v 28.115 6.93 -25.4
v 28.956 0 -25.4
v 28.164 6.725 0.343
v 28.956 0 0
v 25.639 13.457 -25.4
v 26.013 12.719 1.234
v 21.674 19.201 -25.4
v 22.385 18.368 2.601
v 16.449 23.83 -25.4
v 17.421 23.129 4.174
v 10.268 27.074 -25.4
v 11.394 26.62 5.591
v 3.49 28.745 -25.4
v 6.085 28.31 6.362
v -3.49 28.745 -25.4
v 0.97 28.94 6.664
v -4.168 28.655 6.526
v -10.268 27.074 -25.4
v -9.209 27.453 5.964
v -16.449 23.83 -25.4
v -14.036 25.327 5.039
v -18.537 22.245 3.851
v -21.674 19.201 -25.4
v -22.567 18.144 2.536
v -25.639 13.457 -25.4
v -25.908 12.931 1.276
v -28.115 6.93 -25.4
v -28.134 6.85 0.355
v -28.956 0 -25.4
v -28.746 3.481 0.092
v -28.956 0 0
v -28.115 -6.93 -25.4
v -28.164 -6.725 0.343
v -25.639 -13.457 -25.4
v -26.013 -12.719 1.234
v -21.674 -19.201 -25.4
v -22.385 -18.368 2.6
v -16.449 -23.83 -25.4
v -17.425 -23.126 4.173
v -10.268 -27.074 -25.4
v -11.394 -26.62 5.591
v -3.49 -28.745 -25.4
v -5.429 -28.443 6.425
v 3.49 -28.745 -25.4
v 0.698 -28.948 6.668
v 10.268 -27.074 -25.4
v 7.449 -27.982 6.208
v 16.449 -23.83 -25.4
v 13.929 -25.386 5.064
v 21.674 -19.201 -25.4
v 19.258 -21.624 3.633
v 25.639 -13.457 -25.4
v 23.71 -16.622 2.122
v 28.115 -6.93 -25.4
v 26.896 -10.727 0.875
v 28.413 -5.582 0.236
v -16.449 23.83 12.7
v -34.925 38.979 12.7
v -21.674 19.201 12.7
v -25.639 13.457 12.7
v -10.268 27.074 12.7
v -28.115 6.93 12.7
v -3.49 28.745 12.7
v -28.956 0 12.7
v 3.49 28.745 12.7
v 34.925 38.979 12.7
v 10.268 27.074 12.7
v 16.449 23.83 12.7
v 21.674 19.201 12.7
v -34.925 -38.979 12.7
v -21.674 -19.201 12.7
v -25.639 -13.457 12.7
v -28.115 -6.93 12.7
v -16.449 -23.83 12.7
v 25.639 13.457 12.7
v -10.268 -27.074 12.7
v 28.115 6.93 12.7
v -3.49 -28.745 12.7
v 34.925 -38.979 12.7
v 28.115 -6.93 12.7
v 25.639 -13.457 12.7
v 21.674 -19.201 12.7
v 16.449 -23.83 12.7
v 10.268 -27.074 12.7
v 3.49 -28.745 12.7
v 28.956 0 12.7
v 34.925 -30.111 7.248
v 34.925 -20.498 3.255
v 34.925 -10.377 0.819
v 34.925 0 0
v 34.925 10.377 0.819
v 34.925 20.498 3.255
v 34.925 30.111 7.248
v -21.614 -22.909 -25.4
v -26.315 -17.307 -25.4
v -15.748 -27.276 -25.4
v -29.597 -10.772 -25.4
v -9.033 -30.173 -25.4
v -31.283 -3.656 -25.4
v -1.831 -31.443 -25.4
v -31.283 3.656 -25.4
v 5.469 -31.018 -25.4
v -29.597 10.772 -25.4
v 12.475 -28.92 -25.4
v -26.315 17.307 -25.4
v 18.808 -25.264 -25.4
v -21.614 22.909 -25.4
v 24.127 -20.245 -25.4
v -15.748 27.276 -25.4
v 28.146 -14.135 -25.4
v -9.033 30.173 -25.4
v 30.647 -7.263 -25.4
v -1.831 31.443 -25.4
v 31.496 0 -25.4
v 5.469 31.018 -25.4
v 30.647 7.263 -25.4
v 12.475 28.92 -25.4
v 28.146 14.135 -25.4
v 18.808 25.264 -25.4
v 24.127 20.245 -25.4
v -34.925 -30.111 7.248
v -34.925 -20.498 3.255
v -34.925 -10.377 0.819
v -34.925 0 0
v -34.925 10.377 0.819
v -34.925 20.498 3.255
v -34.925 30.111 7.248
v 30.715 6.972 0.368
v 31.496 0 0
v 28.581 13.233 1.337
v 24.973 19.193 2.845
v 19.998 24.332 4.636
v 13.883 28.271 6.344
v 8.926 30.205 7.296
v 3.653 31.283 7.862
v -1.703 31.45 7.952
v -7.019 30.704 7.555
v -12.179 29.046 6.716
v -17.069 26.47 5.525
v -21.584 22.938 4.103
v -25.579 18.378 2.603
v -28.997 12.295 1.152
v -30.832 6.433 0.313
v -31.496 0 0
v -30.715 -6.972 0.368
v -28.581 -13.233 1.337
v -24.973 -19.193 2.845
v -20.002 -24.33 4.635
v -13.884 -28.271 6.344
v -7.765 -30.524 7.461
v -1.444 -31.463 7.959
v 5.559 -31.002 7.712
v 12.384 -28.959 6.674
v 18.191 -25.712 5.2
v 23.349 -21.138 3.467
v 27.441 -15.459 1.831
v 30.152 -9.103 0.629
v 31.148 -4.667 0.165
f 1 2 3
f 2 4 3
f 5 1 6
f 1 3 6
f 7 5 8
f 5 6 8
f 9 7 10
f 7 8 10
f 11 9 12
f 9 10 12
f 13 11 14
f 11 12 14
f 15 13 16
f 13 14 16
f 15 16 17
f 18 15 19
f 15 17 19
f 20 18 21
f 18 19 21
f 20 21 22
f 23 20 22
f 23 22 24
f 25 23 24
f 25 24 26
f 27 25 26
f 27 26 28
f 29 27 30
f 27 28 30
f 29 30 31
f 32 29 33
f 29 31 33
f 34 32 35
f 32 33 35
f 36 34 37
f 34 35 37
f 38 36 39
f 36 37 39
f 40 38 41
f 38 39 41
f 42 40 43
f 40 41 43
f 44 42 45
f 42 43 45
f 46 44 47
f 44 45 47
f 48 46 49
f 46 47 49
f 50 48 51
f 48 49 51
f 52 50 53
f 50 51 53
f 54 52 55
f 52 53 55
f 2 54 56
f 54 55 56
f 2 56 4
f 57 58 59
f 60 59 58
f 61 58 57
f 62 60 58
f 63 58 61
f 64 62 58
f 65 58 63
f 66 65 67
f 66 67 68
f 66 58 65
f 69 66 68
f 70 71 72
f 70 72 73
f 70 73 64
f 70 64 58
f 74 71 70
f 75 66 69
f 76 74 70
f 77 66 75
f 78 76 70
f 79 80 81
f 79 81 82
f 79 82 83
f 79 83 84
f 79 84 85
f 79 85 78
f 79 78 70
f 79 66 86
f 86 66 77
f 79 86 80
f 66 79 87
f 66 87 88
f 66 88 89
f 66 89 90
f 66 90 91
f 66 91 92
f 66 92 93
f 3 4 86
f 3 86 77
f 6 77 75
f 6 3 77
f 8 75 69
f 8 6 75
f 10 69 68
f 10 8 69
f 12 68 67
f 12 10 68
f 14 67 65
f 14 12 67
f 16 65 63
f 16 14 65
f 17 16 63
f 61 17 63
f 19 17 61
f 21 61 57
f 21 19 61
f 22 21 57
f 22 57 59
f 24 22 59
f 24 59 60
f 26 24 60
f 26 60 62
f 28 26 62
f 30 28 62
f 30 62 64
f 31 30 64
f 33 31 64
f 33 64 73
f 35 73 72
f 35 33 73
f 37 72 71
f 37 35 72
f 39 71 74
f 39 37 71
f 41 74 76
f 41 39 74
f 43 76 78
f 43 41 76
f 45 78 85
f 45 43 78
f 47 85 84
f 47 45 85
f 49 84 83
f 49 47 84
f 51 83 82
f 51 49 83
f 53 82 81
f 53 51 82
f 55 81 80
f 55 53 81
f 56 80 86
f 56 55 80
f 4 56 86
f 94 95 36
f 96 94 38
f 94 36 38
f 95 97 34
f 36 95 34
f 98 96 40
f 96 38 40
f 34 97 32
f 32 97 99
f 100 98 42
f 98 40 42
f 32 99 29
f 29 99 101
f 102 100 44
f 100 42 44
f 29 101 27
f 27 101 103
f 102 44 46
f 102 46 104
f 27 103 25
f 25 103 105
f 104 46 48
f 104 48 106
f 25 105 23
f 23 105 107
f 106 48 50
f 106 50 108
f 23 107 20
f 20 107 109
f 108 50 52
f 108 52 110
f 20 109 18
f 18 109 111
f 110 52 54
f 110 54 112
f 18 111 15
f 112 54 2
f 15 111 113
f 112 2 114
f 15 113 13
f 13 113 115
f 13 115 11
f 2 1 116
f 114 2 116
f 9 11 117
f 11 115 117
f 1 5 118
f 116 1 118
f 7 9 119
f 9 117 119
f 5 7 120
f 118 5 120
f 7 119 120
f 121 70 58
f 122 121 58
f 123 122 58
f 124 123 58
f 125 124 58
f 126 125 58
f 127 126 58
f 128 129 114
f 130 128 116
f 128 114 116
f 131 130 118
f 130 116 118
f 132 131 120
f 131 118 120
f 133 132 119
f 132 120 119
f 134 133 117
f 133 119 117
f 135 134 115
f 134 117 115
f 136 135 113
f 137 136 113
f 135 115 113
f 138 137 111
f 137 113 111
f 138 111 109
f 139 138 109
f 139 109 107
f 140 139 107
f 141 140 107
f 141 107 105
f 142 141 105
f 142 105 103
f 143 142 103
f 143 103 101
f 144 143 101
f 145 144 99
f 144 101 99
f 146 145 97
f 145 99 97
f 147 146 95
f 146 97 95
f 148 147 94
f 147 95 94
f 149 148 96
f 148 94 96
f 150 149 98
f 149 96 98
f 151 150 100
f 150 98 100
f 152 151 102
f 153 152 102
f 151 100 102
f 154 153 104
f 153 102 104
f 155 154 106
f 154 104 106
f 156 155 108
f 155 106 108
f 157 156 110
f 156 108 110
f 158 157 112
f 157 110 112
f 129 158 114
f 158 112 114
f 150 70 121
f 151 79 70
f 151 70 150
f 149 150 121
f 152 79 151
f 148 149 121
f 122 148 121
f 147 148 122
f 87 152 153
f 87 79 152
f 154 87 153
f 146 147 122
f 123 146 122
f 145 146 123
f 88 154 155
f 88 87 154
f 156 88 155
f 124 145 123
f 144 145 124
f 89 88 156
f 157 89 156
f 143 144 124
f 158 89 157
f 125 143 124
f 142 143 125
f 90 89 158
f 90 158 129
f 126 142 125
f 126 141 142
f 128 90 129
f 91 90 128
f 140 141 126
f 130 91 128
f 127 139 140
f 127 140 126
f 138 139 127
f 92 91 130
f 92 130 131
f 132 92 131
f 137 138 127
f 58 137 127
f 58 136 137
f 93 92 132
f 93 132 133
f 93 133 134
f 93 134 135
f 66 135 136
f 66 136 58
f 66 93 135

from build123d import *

# Parameters (mm, degrees)
F0_R          = 31.496
F0_R_2        = 28.956
F1_DEPTH      = 25.4
F1_DEPTH_BACK = 12.7
F3_DEPTH      = 34.925
F3_DEPTH_BACK = 34.925
F4_DEPTH      = 25.4


with BuildPart() as f1:
    # F0 (on Top) → F1 (new body, two sides)
    with BuildSketch(Plane.XY) as f1_sk:
        Circle(F0_R)
        Circle(F0_R_2, mode=Mode.SUBTRACT)
    extrude(amount=-F1_DEPTH)
    extrude(f1_sk.sketch, amount=F1_DEPTH_BACK)

    # F2 (on Right) → F3 (join, two sides)
    with BuildSketch(Plane.YZ) as f3_sk:
        with BuildLine():
            ThreePointArc((-38.9788635032, 12.7), (-20.4978157373, 3.2550660049), (0, 0))
            ThreePointArc((0, 0), (20.4978157373, 3.2550660049), (38.9788635032, 12.7))
            Line((38.9788635032, 12.7), (-38.9788635032, 12.7))
        make_face()
    extrude(amount=F3_DEPTH)
    extrude(f3_sk.sketch, amount=-F3_DEPTH_BACK)

    # F0 (on Top) → F4 (cut)
    with BuildSketch(Plane.XY):
        Circle(F0_R_2)
    extrude(amount=F4_DEPTH, mode=Mode.SUBTRACT)


solid = f1.part
